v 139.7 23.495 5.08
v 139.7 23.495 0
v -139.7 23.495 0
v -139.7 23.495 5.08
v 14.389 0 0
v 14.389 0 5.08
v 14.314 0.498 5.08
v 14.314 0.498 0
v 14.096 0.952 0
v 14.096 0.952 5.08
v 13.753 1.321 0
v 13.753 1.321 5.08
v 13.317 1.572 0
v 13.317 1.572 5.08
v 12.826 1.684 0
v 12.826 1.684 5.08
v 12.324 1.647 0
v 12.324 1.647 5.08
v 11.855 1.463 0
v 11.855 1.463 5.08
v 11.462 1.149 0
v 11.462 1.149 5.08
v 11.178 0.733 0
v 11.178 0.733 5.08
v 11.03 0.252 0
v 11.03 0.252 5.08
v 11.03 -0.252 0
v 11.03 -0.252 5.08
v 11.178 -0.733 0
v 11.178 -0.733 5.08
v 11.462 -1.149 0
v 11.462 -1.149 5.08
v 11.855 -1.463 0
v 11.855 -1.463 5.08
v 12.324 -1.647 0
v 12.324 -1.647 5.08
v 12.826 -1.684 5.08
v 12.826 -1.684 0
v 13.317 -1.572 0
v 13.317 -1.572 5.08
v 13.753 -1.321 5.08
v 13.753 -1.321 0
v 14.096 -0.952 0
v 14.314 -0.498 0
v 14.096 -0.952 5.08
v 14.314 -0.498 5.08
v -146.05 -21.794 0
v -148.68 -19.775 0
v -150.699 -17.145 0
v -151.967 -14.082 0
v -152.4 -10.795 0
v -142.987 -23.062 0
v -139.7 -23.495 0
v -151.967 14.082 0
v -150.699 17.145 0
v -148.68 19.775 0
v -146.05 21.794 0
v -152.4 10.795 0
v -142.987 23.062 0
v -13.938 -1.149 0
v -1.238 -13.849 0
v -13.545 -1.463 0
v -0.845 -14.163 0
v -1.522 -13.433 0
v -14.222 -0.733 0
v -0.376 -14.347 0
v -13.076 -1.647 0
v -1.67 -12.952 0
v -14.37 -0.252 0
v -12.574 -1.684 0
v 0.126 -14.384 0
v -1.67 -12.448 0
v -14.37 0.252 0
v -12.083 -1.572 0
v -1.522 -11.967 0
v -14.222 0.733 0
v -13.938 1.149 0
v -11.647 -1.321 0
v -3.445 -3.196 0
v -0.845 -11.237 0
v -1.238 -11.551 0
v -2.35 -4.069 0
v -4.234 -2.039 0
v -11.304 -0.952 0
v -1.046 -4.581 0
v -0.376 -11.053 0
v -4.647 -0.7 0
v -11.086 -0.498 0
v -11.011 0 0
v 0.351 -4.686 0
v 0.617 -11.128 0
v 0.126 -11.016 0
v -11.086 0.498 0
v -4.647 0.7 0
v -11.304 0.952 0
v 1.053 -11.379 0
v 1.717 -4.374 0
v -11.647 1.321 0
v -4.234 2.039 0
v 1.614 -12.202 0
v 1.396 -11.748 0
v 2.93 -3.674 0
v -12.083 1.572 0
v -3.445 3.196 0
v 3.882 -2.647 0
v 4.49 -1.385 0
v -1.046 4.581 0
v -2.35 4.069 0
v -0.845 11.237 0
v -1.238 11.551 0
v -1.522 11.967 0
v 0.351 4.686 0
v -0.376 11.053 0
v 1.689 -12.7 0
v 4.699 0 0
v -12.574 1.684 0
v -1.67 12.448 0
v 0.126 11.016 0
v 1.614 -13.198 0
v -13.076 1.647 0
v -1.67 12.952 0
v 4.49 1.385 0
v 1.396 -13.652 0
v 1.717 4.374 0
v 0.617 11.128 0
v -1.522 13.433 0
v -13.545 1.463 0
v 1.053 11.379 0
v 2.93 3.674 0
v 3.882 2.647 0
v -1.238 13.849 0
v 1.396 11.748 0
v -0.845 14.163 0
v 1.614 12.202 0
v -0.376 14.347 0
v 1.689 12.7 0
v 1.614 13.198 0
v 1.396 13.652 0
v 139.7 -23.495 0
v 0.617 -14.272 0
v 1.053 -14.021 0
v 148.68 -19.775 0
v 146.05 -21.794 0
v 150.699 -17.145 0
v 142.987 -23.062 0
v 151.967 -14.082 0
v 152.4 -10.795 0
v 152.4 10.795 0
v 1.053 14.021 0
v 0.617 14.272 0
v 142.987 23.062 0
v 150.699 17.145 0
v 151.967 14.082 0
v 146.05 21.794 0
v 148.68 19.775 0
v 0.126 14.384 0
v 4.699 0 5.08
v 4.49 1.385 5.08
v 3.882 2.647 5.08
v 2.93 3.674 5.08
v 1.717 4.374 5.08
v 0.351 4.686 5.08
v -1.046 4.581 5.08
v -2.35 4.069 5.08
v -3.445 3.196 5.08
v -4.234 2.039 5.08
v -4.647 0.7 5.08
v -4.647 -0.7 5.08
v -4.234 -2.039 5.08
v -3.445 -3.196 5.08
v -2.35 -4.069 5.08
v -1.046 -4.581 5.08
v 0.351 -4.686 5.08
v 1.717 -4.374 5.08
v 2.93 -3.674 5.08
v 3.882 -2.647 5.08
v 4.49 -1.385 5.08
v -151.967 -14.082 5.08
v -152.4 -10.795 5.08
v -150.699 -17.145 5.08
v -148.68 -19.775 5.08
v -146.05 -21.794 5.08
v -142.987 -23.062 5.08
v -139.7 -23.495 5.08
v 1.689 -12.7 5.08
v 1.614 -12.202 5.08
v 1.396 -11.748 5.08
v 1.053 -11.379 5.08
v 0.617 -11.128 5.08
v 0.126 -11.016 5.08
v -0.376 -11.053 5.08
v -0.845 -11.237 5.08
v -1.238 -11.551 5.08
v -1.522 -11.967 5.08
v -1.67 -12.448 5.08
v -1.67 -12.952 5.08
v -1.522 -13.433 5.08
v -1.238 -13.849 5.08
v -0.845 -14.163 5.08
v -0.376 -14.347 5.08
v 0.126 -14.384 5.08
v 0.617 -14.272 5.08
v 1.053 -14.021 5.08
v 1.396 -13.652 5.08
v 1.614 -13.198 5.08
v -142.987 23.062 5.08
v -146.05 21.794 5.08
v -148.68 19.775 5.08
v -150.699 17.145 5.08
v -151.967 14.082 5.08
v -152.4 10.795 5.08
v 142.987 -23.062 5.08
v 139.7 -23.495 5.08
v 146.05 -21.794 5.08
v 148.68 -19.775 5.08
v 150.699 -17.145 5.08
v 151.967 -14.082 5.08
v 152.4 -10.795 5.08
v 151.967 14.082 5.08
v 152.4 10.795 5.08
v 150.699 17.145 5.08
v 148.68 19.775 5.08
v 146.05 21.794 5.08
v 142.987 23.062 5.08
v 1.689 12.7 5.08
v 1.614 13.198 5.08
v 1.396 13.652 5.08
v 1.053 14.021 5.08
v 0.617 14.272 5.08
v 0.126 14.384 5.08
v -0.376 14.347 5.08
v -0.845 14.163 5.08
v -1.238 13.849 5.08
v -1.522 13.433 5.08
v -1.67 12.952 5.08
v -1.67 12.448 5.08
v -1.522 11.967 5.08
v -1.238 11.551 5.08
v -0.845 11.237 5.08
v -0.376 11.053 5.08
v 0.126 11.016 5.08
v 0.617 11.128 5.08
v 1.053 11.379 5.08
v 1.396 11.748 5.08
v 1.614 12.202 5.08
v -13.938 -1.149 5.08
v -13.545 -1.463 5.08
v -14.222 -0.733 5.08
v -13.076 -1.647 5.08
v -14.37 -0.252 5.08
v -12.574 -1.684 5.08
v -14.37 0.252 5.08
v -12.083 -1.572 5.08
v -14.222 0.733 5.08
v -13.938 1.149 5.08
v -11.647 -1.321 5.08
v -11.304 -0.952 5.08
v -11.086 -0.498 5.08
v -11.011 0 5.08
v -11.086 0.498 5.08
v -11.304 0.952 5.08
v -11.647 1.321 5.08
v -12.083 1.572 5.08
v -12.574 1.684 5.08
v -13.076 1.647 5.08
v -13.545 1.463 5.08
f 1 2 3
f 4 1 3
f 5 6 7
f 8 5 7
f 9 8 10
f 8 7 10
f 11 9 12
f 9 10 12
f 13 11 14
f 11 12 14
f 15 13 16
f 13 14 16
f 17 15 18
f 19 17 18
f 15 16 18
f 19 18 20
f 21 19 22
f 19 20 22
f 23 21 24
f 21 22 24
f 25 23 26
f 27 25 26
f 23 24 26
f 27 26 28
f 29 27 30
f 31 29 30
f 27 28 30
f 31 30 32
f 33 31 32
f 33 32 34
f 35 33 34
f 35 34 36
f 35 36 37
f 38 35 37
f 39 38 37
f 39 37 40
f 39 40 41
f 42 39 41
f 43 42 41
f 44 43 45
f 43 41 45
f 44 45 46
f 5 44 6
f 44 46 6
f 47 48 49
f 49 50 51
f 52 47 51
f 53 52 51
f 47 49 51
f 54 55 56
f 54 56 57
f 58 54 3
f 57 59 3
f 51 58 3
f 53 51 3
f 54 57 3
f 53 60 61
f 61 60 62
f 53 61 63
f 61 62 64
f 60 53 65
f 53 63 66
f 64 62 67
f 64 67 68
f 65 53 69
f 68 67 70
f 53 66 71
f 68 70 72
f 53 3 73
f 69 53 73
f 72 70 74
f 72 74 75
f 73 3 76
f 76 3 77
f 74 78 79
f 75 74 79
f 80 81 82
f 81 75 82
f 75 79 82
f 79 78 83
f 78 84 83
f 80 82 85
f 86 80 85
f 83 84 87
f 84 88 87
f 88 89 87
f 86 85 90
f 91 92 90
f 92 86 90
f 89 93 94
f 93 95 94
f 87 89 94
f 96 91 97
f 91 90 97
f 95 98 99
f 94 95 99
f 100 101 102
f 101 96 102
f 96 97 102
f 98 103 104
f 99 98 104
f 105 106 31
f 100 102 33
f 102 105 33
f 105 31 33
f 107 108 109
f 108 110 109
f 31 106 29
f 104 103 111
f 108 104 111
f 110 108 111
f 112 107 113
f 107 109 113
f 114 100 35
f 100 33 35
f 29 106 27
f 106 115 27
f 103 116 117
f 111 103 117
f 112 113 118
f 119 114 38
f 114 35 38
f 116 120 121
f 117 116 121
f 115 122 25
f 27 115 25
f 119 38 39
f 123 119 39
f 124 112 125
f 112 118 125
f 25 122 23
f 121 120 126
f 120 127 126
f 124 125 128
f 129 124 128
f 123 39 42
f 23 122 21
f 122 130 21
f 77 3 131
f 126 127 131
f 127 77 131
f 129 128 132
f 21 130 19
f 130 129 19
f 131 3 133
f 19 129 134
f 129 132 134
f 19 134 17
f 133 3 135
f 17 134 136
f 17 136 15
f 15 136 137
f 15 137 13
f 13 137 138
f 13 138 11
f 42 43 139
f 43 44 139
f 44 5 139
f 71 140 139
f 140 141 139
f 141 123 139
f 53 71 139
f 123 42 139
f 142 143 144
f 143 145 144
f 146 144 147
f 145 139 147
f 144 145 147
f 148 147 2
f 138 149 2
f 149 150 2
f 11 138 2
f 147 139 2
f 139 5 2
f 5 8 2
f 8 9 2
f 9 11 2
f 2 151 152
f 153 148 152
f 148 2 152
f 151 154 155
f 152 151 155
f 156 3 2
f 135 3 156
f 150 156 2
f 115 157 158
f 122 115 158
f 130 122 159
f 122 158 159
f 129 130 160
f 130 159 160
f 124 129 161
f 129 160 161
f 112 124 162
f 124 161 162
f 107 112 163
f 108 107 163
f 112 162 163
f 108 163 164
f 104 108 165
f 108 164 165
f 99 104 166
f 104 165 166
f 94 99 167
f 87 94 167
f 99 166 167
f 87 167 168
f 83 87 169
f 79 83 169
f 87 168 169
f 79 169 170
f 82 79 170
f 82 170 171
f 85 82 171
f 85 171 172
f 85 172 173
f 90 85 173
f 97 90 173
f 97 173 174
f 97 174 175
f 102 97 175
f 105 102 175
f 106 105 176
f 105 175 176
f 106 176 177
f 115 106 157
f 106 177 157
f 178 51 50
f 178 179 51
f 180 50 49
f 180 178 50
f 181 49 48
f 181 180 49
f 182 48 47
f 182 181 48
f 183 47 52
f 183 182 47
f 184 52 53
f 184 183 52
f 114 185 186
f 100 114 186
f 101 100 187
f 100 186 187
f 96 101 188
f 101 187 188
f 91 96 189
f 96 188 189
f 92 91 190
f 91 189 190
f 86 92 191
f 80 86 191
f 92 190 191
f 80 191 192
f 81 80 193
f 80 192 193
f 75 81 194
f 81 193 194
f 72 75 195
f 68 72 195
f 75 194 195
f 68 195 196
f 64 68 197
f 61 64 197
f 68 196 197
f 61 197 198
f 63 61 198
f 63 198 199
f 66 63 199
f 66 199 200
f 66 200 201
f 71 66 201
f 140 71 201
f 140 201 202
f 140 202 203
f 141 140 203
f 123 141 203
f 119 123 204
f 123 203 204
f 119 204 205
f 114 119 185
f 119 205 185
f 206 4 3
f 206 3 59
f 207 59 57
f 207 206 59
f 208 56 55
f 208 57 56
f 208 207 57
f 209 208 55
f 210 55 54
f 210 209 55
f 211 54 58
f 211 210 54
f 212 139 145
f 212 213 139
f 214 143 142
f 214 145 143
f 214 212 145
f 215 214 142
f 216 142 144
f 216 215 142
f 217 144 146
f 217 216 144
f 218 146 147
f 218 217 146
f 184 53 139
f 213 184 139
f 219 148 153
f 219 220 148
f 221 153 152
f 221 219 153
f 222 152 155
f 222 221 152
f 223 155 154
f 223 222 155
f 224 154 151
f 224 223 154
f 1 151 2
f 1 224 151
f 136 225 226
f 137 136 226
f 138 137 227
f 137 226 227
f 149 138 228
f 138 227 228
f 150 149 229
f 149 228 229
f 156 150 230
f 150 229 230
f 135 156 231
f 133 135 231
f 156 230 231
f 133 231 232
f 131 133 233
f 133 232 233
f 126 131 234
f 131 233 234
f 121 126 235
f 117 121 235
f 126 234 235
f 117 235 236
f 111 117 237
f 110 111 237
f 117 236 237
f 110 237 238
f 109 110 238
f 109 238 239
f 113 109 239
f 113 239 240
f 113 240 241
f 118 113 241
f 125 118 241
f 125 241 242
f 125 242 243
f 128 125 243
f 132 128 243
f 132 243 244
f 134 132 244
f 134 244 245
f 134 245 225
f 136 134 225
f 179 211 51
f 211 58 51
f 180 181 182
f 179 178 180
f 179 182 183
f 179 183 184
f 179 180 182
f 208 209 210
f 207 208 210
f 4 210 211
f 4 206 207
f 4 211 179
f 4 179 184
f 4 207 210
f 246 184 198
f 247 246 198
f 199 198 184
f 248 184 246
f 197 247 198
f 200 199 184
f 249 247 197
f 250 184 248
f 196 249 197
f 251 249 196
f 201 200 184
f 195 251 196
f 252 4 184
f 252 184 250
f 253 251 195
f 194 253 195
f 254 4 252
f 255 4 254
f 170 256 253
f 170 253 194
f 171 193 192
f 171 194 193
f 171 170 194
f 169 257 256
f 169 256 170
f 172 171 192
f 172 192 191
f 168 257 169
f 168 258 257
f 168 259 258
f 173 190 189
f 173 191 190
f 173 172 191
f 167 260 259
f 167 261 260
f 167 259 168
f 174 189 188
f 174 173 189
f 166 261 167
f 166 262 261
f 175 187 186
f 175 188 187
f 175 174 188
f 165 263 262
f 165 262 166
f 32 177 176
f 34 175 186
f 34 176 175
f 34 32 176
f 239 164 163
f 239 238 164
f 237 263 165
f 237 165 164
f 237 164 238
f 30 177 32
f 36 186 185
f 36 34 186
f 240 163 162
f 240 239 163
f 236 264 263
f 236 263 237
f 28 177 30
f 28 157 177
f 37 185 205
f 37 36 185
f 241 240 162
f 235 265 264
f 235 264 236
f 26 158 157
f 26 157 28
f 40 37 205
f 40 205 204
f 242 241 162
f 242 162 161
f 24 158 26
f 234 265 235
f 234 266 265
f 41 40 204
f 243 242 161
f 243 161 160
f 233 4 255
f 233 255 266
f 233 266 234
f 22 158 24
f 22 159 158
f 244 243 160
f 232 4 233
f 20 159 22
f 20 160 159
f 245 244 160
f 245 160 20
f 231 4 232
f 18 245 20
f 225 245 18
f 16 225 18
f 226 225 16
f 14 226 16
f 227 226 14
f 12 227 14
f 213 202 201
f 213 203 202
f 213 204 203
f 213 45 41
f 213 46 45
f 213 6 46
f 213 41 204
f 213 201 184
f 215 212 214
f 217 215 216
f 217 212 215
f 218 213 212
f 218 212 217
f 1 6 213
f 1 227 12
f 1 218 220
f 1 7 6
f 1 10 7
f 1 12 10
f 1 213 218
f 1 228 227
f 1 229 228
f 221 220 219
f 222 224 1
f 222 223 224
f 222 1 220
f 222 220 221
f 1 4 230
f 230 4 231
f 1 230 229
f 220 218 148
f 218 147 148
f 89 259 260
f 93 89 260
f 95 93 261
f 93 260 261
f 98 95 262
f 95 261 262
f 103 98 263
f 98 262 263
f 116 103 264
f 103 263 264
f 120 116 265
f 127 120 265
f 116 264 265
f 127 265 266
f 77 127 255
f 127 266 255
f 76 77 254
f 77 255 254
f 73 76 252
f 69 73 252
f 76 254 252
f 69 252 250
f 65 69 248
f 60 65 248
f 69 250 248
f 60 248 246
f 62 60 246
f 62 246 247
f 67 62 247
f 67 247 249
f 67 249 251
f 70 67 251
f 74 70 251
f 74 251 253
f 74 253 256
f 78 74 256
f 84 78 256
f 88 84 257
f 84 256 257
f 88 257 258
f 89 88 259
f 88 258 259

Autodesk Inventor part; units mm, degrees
ref_plane "YZ Plane" through (0, 0, 0) normal (1, 0, 0) x (0, 1, 0)
ref_plane "XZ Plane" through (0, 0, 0) normal (0, 1, 0) x (-1, 0, 0)
ref_plane "XY Plane" through (0, 0, 0) normal (0, 0, 1) x (1, 0, 0)
sketch "Sketch1" plane through (0, 0, 0) normal (0, 0, 1) x (1, 0, 0)
  line L0 (-152.4, -23.495) -> (152.4, -23.495)
  line L1 (152.4, -23.495) -> (152.4, 23.495)
  line L2 (152.4, 23.495) -> (-152.4, 23.495)
  line L3 (-152.4, 23.495) -> (-152.4, -23.495)
  line L4 (-152.4, -23.495) -> (152.4, 23.495) construction
  line L5 (152.4, -23.495) -> (-152.4, 23.495) construction
  point P0 (0, 0)
  dimension "d0" = 304.8
  dimension "d1" = 46.99
extrude "Extrusion1" add sketch "Sketch1" along normal blind 5.08
fillet "Fillet1" radius 12.7 4 edges at (152.4, 23.495, 2.54) (152.4, -23.495, 2.54) (-152.4, 23.495, 2.54) (-152.4, -23.495, 2.54)
sketch "Sketch2" plane through (0, 0, 5.08) normal (0, 0, 1) x (1, 0, 0)
  line L0 (-40.64, -20.32) -> (40.64, -20.32)
  line L1 (40.64, -20.32) -> (40.64, 20.32)
  line L2 (40.64, 20.32) -> (-40.64, 20.32)
  line L3 (-40.64, 20.32) -> (-40.64, -20.32)
  line L4 (-40.64, -20.32) -> (40.64, 20.32) construction
  line L5 (40.64, -20.32) -> (-40.64, 20.32) construction
  point P0 (0, 0)
  dimension "d5" = 81.28
  dimension "d6" = 40.64
sketch "Sketch3" plane through (0, 0, 5.08) normal (0, 0, 1) x (1, 0, 0)
  circle A0 centre (0, 12.7) radius 1.6891
  circle A1 centre (0, -12.7) radius 1.6891
  circle A2 centre (12.7, 0) radius 1.6891
  circle A3 centre (-12.7, 0) radius 1.6891
  circle A4 centre (0, 0) radius 4.699
  point P0 (0, 0)
  point P1 (0, 0)
  dimension "d7" = 3.3782
  dimension "d8" = 3.3782
  dimension "d9" = 3.3782
  dimension "d10" = 3.3782
  dimension "d11" = 9.398
  dimension "d12" = 12.7
  dimension "d13" = 12.7
  dimension "d14" = 12.7
  dimension "d15" = 12.7
  dimension "d16" = 0
extrude "Extrusion2" cut sketch "Sketch3" against normal blind 5.08
properties part number "New_Top"
